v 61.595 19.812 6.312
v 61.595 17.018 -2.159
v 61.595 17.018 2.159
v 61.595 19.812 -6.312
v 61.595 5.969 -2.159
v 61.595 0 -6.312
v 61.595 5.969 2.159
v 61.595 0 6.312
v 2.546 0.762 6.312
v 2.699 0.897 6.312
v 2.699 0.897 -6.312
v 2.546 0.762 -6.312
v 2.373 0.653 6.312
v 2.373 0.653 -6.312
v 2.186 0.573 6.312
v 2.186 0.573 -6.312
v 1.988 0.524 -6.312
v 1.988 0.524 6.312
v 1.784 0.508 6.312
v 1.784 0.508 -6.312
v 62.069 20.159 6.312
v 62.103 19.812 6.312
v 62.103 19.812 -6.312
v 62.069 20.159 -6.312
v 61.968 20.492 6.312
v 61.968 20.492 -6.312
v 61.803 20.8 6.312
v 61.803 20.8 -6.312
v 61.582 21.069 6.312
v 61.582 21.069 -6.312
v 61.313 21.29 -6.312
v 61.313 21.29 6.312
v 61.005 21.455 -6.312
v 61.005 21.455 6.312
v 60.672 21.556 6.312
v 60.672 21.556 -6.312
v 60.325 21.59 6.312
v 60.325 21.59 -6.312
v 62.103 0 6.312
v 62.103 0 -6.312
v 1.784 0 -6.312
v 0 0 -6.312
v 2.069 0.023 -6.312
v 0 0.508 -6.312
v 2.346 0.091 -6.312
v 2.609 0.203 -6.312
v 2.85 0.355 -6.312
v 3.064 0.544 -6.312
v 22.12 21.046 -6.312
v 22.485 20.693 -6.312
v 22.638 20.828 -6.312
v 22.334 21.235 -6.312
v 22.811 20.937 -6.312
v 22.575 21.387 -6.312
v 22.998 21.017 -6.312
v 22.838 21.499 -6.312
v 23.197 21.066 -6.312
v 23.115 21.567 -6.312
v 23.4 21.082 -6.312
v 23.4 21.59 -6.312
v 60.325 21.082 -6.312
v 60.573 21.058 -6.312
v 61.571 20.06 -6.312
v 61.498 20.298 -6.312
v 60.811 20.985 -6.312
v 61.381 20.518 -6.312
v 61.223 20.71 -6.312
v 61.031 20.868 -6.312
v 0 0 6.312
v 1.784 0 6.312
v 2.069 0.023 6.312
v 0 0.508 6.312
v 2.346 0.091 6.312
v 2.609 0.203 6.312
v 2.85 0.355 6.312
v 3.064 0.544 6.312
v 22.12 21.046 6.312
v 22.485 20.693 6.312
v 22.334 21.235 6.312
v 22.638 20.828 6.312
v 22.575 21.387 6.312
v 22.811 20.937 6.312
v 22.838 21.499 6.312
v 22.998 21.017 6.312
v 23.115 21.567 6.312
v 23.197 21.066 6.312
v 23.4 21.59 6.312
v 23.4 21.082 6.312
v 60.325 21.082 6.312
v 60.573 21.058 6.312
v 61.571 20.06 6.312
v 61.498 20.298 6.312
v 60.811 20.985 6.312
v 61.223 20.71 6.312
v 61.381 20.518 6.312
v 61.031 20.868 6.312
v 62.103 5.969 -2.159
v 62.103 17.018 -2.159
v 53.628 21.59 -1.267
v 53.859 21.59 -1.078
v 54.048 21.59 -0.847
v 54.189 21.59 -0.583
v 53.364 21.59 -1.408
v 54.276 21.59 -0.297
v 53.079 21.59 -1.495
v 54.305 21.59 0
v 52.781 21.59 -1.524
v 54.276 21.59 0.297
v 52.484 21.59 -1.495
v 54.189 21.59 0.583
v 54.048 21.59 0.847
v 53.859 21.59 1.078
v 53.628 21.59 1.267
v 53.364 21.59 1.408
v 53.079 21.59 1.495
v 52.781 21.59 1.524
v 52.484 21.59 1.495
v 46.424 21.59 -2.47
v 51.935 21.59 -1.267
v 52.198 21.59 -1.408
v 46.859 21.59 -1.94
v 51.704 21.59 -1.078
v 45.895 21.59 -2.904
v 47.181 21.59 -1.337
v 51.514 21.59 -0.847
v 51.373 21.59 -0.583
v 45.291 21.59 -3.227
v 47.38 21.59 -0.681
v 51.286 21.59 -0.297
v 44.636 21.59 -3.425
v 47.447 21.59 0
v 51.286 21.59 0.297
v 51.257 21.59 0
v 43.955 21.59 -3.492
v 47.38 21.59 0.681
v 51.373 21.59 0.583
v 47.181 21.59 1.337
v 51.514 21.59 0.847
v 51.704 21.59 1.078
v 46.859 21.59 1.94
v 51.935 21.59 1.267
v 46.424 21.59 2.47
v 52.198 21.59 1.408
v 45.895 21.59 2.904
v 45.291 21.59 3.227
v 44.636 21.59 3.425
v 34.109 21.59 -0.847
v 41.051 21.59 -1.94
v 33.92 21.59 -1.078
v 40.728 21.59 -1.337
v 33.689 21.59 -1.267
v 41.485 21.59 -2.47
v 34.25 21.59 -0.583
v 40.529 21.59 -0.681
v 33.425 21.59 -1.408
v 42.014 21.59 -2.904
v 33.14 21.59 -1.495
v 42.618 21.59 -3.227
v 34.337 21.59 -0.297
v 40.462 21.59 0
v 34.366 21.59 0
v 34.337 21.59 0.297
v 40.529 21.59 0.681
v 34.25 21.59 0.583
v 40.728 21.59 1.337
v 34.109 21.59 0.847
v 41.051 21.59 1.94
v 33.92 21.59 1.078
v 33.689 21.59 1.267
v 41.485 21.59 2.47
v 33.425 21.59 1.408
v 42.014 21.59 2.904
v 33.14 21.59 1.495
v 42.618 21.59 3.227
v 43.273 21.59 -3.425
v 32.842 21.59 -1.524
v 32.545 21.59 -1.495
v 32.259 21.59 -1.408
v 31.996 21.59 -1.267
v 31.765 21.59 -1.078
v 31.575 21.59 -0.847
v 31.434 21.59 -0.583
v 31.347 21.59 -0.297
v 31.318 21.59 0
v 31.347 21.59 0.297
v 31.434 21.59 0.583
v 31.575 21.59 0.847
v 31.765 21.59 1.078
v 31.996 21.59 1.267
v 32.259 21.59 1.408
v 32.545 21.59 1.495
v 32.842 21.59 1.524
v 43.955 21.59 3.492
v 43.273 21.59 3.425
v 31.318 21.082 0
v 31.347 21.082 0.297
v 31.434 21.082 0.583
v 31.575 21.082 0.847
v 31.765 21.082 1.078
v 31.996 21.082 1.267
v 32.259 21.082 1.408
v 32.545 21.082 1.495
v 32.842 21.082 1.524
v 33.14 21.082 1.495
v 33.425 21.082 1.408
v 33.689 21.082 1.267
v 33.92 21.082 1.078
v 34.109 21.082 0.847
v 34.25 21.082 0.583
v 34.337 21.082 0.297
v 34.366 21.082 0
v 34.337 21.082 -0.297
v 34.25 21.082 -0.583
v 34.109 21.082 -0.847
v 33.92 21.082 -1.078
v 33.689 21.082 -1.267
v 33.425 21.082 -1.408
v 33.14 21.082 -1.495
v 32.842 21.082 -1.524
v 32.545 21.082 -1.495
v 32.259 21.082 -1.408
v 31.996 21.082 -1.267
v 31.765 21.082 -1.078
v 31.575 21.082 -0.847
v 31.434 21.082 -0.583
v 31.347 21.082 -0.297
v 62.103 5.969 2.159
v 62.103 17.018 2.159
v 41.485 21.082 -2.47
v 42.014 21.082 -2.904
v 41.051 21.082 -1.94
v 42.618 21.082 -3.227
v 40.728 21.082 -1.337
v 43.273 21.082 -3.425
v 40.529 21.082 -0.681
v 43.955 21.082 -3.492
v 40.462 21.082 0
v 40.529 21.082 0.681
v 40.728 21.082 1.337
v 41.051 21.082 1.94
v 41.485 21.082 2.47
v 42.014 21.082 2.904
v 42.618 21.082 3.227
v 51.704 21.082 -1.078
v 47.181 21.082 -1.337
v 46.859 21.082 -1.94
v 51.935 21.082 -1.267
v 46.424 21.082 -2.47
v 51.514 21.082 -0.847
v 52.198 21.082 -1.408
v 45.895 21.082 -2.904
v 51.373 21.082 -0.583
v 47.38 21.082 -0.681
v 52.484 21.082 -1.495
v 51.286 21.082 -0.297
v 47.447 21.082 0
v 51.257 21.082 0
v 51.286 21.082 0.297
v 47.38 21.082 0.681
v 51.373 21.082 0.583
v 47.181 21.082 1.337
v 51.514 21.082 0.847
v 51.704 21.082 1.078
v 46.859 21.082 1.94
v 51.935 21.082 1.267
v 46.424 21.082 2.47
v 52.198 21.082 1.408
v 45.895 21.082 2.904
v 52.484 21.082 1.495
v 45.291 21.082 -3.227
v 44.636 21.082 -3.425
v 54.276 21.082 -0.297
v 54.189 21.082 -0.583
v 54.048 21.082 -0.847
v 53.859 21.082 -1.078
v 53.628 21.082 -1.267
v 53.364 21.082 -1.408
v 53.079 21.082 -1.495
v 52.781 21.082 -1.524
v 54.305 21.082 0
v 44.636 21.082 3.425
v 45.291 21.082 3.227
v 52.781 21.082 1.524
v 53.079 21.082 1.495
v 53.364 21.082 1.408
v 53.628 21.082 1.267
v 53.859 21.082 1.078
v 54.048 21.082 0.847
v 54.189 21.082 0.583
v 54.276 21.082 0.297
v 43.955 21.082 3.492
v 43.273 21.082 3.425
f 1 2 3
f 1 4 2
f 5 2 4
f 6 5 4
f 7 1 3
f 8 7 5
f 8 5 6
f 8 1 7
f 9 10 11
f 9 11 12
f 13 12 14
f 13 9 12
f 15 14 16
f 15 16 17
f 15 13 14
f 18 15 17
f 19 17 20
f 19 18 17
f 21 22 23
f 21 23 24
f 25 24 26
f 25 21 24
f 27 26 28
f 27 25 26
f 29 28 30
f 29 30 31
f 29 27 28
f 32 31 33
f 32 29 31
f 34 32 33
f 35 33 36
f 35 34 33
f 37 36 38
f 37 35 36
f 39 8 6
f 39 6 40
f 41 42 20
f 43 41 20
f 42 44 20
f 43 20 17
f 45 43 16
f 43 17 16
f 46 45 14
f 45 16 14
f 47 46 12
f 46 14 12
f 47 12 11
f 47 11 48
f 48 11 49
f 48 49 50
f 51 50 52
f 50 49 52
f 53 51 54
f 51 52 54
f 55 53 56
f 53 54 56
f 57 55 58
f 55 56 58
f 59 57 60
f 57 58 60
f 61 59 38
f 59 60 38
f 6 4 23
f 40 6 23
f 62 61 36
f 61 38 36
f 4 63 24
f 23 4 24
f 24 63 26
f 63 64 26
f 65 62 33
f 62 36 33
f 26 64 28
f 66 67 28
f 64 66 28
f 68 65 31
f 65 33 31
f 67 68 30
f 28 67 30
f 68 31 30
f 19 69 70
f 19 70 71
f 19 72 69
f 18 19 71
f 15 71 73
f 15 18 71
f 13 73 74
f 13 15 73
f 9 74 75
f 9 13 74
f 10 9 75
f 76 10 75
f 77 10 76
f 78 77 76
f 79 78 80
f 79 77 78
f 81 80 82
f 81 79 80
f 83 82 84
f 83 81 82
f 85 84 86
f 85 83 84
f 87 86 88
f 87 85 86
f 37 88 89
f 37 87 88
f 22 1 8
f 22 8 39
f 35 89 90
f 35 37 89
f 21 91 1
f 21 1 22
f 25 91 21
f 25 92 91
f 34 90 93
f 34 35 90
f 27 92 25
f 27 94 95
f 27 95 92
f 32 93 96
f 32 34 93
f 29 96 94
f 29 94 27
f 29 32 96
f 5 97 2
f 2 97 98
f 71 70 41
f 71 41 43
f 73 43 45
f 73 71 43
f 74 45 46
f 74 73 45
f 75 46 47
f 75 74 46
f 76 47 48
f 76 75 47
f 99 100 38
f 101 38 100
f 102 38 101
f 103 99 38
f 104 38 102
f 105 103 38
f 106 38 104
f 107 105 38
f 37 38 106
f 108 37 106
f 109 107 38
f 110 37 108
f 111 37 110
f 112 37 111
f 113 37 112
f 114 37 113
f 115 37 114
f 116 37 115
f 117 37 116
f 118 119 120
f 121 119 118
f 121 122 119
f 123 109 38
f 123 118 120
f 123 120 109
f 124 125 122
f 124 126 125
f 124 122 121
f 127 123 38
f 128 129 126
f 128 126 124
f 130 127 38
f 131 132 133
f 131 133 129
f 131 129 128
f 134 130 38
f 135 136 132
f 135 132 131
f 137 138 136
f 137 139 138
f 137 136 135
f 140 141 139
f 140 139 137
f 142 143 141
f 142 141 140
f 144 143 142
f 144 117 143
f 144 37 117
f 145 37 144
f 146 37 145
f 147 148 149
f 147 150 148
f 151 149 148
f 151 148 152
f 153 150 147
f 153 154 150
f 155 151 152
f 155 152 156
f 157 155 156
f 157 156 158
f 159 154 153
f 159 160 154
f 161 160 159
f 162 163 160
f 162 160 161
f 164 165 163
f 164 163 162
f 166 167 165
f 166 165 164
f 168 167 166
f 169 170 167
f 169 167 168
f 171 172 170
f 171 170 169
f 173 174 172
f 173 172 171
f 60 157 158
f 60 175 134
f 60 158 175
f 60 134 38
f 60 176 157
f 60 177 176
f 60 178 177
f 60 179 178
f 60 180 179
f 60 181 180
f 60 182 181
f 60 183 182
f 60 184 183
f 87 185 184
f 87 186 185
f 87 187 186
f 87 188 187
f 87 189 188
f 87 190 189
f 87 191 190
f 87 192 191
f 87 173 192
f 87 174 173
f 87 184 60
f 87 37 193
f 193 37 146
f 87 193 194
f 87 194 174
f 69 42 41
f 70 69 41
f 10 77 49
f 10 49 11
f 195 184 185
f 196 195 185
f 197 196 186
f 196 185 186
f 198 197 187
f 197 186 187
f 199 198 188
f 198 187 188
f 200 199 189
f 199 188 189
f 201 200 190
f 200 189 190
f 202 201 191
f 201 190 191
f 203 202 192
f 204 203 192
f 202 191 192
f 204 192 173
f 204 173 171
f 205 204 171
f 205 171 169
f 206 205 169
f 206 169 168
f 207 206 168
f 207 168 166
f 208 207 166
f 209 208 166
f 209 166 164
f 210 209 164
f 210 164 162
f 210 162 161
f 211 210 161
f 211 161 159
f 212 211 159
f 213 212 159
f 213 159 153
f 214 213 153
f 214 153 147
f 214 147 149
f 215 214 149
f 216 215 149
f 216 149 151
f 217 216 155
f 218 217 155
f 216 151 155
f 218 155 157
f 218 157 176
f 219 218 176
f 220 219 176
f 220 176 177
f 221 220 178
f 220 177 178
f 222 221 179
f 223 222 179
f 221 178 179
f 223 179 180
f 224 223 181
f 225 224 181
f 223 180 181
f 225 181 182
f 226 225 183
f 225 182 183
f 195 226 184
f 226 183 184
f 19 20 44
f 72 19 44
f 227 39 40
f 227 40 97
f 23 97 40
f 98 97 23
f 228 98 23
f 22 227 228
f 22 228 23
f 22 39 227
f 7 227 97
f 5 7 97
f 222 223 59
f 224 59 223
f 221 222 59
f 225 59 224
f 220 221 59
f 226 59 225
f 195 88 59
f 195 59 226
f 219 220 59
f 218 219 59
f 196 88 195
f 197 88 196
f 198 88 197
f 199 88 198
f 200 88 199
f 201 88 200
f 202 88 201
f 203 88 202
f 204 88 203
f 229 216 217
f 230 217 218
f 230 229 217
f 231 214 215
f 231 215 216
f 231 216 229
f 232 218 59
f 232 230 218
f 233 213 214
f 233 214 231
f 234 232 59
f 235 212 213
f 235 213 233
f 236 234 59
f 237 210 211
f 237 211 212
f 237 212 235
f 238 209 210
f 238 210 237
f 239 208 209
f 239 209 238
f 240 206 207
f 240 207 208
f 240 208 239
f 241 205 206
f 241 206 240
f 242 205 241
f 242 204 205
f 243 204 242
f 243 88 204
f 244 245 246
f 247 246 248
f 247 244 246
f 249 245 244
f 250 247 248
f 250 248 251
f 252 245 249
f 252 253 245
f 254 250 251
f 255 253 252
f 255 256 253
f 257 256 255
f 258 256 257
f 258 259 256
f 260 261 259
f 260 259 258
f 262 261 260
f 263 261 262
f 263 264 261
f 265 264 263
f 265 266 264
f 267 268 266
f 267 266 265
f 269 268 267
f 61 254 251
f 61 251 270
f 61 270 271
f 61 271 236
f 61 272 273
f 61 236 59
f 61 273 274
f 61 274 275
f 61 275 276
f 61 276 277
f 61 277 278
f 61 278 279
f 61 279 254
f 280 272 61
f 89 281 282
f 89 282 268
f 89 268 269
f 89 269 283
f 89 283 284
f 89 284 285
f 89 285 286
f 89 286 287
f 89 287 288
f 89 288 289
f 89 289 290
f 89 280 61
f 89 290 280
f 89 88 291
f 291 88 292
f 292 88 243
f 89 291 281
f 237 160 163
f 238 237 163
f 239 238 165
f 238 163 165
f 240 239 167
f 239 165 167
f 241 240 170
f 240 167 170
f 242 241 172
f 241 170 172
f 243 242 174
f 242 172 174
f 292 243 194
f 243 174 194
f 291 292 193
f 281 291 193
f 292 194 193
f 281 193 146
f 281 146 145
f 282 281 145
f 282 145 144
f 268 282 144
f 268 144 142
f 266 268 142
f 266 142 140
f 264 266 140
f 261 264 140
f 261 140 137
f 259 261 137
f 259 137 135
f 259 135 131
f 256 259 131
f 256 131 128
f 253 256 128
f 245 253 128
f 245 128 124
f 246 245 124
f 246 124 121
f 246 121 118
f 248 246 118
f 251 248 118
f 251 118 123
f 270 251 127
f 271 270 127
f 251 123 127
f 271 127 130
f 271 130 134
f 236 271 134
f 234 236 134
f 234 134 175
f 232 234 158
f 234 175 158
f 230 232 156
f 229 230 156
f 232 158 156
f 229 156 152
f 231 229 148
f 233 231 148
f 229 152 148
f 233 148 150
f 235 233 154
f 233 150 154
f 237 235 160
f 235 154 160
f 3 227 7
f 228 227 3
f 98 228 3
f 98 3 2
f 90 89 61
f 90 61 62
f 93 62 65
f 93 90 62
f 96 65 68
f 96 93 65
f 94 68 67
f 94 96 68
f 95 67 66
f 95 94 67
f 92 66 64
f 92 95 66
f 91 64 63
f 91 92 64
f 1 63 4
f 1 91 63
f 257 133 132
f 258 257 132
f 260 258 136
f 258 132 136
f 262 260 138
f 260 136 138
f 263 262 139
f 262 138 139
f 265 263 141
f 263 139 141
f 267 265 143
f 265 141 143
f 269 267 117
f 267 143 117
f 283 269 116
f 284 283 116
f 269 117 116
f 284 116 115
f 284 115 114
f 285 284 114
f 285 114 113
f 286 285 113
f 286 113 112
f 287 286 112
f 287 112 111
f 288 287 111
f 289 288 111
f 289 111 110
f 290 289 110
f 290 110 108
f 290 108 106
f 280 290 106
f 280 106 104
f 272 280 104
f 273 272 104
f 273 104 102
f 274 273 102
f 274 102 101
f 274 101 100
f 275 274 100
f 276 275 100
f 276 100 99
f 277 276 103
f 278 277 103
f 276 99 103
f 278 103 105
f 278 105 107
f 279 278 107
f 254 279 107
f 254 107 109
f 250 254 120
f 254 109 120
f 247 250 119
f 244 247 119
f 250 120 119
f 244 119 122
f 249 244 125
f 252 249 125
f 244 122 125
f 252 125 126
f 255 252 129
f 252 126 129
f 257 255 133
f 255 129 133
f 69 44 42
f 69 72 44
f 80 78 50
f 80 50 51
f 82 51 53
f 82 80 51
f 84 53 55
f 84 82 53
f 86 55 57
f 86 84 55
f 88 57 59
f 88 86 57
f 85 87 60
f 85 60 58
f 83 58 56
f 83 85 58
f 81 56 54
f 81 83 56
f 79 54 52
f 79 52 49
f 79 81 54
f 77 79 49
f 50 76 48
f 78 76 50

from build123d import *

# Parameters (mm, degrees)
EXTRUDE_THIN1_DEPTH = 6.3119
CUT_EXTRUDE1_REACH  = 68.051
SKETCH2_W           = 4.318
SKETCH2_H           = 11.049
CUT_EXTRUDE2_REACH  = 68.051
SKETCH3_R           = 1.524
SKETCH3_R_2         = 3.4925


with BuildPart() as part:
    # Sketch1 → Extrude-Thin1 (new, symmetric)
    with BuildSketch(Plane.XY):
        with BuildLine():
            Line((0, 0), (1.784287341, 0))
            ThreePointArc((1.784287341, 0), (2.479784243, 0.141672386), (3.064445706, 0.54411242))
            Line((3.064445706, 0.54411242), (22.485395925, 20.693348272))
            ThreePointArc((22.485395925, 20.693348272), (22.903011255, 20.980805438), (23.399794757, 21.082))
            Line((23.399794757, 21.082), (60.325, 21.082))
            ThreePointArc((60.325, 21.082), (61.223025612, 20.710025612), (61.595, 19.812))
            Line((61.595, 19.812), (61.595, 0))
            Line((61.595, 0), (62.103, 0))
            Line((62.103, 0), (62.103, 19.812))
            ThreePointArc((62.103, 19.812), (61.582235857, 21.069235857), (60.325, 21.59))
            Line((60.325, 21.59), (23.399794757, 21.59))
            ThreePointArc((23.399794757, 21.59), (22.704297854, 21.448327614), (22.119636392, 21.04588758))
            Line((22.119636392, 21.04588758), (2.698686173, 0.896651728))
            ThreePointArc((2.698686173, 0.896651728), (2.281070842, 0.609194562), (1.784287341, 0.508))
            Line((1.784287341, 0.508), (0, 0.508))
            Line((0, 0.508), (0, 0))
        make_face()
    extrude(amount=EXTRUDE_THIN1_DEPTH, both=True)

    # Sketch2 → Cut-Extrude1 (cut, up to next)
    with BuildSketch(Plane(origin=(62.103, 0, 0), x_dir=(0, 0, -1), z_dir=(1, 0, 0)), mode=Mode.PRIVATE) as cut_extrude1_sk1:
        with Locations((0, 11.4935)):
            Rectangle(SKETCH2_W, SKETCH2_H)
    cut_extrude1_tool1 = extrude(cut_extrude1_sk1.sketch, amount=-CUT_EXTRUDE1_REACH, mode=Mode.PRIVATE) & part.part
    add(cut_extrude1_tool1.solids().sort_by_distance((62.103, 11.4935, 0))[0], mode=Mode.SUBTRACT)

    # Sketch3 → Cut-Extrude2 (cut, up to next)
    with BuildSketch(Plane(origin=(0, 21.59, 0), x_dir=(1, 0, 0), z_dir=(0, 1, 0)), mode=Mode.PRIVATE) as cut_extrude2_sk1:
        with Locations((52.7812, 0)):
            Circle(SKETCH3_R)
    cut_extrude2_tool1 = extrude(cut_extrude2_sk1.sketch, amount=-CUT_EXTRUDE2_REACH, mode=Mode.PRIVATE) & part.part
    # Sketch3 → Cut-Extrude2 (cut, up to next)
    with BuildSketch(Plane(origin=(0, 21.59, 0), x_dir=(1, 0, 0), z_dir=(0, 1, 0)), mode=Mode.PRIVATE) as cut_extrude2_sk2:
        with Locations((32.8422, 0)):
            Circle(SKETCH3_R)
    cut_extrude2_tool2 = extrude(cut_extrude2_sk2.sketch, amount=-CUT_EXTRUDE2_REACH, mode=Mode.PRIVATE) & part.part
    # Sketch3 → Cut-Extrude2 (cut, up to next)
    with BuildSketch(Plane(origin=(0, 21.59, 0), x_dir=(1, 0, 0), z_dir=(0, 1, 0)), mode=Mode.PRIVATE) as cut_extrude2_sk3:
        with Locations((43.9547, 0)):
            Circle(SKETCH3_R_2)
    cut_extrude2_tool3 = extrude(cut_extrude2_sk3.sketch, amount=-CUT_EXTRUDE2_REACH, mode=Mode.PRIVATE) & part.part
    add(cut_extrude2_tool1.solids().sort_by_distance((52.7812, 21.59, 0))[0], mode=Mode.SUBTRACT)
    add(cut_extrude2_tool2.solids().sort_by_distance((32.8422, 21.59, 0))[0], mode=Mode.SUBTRACT)
    add(cut_extrude2_tool3.solids().sort_by_distance((43.9547, 21.59, 0))[0], mode=Mode.SUBTRACT)


solid = part.part
